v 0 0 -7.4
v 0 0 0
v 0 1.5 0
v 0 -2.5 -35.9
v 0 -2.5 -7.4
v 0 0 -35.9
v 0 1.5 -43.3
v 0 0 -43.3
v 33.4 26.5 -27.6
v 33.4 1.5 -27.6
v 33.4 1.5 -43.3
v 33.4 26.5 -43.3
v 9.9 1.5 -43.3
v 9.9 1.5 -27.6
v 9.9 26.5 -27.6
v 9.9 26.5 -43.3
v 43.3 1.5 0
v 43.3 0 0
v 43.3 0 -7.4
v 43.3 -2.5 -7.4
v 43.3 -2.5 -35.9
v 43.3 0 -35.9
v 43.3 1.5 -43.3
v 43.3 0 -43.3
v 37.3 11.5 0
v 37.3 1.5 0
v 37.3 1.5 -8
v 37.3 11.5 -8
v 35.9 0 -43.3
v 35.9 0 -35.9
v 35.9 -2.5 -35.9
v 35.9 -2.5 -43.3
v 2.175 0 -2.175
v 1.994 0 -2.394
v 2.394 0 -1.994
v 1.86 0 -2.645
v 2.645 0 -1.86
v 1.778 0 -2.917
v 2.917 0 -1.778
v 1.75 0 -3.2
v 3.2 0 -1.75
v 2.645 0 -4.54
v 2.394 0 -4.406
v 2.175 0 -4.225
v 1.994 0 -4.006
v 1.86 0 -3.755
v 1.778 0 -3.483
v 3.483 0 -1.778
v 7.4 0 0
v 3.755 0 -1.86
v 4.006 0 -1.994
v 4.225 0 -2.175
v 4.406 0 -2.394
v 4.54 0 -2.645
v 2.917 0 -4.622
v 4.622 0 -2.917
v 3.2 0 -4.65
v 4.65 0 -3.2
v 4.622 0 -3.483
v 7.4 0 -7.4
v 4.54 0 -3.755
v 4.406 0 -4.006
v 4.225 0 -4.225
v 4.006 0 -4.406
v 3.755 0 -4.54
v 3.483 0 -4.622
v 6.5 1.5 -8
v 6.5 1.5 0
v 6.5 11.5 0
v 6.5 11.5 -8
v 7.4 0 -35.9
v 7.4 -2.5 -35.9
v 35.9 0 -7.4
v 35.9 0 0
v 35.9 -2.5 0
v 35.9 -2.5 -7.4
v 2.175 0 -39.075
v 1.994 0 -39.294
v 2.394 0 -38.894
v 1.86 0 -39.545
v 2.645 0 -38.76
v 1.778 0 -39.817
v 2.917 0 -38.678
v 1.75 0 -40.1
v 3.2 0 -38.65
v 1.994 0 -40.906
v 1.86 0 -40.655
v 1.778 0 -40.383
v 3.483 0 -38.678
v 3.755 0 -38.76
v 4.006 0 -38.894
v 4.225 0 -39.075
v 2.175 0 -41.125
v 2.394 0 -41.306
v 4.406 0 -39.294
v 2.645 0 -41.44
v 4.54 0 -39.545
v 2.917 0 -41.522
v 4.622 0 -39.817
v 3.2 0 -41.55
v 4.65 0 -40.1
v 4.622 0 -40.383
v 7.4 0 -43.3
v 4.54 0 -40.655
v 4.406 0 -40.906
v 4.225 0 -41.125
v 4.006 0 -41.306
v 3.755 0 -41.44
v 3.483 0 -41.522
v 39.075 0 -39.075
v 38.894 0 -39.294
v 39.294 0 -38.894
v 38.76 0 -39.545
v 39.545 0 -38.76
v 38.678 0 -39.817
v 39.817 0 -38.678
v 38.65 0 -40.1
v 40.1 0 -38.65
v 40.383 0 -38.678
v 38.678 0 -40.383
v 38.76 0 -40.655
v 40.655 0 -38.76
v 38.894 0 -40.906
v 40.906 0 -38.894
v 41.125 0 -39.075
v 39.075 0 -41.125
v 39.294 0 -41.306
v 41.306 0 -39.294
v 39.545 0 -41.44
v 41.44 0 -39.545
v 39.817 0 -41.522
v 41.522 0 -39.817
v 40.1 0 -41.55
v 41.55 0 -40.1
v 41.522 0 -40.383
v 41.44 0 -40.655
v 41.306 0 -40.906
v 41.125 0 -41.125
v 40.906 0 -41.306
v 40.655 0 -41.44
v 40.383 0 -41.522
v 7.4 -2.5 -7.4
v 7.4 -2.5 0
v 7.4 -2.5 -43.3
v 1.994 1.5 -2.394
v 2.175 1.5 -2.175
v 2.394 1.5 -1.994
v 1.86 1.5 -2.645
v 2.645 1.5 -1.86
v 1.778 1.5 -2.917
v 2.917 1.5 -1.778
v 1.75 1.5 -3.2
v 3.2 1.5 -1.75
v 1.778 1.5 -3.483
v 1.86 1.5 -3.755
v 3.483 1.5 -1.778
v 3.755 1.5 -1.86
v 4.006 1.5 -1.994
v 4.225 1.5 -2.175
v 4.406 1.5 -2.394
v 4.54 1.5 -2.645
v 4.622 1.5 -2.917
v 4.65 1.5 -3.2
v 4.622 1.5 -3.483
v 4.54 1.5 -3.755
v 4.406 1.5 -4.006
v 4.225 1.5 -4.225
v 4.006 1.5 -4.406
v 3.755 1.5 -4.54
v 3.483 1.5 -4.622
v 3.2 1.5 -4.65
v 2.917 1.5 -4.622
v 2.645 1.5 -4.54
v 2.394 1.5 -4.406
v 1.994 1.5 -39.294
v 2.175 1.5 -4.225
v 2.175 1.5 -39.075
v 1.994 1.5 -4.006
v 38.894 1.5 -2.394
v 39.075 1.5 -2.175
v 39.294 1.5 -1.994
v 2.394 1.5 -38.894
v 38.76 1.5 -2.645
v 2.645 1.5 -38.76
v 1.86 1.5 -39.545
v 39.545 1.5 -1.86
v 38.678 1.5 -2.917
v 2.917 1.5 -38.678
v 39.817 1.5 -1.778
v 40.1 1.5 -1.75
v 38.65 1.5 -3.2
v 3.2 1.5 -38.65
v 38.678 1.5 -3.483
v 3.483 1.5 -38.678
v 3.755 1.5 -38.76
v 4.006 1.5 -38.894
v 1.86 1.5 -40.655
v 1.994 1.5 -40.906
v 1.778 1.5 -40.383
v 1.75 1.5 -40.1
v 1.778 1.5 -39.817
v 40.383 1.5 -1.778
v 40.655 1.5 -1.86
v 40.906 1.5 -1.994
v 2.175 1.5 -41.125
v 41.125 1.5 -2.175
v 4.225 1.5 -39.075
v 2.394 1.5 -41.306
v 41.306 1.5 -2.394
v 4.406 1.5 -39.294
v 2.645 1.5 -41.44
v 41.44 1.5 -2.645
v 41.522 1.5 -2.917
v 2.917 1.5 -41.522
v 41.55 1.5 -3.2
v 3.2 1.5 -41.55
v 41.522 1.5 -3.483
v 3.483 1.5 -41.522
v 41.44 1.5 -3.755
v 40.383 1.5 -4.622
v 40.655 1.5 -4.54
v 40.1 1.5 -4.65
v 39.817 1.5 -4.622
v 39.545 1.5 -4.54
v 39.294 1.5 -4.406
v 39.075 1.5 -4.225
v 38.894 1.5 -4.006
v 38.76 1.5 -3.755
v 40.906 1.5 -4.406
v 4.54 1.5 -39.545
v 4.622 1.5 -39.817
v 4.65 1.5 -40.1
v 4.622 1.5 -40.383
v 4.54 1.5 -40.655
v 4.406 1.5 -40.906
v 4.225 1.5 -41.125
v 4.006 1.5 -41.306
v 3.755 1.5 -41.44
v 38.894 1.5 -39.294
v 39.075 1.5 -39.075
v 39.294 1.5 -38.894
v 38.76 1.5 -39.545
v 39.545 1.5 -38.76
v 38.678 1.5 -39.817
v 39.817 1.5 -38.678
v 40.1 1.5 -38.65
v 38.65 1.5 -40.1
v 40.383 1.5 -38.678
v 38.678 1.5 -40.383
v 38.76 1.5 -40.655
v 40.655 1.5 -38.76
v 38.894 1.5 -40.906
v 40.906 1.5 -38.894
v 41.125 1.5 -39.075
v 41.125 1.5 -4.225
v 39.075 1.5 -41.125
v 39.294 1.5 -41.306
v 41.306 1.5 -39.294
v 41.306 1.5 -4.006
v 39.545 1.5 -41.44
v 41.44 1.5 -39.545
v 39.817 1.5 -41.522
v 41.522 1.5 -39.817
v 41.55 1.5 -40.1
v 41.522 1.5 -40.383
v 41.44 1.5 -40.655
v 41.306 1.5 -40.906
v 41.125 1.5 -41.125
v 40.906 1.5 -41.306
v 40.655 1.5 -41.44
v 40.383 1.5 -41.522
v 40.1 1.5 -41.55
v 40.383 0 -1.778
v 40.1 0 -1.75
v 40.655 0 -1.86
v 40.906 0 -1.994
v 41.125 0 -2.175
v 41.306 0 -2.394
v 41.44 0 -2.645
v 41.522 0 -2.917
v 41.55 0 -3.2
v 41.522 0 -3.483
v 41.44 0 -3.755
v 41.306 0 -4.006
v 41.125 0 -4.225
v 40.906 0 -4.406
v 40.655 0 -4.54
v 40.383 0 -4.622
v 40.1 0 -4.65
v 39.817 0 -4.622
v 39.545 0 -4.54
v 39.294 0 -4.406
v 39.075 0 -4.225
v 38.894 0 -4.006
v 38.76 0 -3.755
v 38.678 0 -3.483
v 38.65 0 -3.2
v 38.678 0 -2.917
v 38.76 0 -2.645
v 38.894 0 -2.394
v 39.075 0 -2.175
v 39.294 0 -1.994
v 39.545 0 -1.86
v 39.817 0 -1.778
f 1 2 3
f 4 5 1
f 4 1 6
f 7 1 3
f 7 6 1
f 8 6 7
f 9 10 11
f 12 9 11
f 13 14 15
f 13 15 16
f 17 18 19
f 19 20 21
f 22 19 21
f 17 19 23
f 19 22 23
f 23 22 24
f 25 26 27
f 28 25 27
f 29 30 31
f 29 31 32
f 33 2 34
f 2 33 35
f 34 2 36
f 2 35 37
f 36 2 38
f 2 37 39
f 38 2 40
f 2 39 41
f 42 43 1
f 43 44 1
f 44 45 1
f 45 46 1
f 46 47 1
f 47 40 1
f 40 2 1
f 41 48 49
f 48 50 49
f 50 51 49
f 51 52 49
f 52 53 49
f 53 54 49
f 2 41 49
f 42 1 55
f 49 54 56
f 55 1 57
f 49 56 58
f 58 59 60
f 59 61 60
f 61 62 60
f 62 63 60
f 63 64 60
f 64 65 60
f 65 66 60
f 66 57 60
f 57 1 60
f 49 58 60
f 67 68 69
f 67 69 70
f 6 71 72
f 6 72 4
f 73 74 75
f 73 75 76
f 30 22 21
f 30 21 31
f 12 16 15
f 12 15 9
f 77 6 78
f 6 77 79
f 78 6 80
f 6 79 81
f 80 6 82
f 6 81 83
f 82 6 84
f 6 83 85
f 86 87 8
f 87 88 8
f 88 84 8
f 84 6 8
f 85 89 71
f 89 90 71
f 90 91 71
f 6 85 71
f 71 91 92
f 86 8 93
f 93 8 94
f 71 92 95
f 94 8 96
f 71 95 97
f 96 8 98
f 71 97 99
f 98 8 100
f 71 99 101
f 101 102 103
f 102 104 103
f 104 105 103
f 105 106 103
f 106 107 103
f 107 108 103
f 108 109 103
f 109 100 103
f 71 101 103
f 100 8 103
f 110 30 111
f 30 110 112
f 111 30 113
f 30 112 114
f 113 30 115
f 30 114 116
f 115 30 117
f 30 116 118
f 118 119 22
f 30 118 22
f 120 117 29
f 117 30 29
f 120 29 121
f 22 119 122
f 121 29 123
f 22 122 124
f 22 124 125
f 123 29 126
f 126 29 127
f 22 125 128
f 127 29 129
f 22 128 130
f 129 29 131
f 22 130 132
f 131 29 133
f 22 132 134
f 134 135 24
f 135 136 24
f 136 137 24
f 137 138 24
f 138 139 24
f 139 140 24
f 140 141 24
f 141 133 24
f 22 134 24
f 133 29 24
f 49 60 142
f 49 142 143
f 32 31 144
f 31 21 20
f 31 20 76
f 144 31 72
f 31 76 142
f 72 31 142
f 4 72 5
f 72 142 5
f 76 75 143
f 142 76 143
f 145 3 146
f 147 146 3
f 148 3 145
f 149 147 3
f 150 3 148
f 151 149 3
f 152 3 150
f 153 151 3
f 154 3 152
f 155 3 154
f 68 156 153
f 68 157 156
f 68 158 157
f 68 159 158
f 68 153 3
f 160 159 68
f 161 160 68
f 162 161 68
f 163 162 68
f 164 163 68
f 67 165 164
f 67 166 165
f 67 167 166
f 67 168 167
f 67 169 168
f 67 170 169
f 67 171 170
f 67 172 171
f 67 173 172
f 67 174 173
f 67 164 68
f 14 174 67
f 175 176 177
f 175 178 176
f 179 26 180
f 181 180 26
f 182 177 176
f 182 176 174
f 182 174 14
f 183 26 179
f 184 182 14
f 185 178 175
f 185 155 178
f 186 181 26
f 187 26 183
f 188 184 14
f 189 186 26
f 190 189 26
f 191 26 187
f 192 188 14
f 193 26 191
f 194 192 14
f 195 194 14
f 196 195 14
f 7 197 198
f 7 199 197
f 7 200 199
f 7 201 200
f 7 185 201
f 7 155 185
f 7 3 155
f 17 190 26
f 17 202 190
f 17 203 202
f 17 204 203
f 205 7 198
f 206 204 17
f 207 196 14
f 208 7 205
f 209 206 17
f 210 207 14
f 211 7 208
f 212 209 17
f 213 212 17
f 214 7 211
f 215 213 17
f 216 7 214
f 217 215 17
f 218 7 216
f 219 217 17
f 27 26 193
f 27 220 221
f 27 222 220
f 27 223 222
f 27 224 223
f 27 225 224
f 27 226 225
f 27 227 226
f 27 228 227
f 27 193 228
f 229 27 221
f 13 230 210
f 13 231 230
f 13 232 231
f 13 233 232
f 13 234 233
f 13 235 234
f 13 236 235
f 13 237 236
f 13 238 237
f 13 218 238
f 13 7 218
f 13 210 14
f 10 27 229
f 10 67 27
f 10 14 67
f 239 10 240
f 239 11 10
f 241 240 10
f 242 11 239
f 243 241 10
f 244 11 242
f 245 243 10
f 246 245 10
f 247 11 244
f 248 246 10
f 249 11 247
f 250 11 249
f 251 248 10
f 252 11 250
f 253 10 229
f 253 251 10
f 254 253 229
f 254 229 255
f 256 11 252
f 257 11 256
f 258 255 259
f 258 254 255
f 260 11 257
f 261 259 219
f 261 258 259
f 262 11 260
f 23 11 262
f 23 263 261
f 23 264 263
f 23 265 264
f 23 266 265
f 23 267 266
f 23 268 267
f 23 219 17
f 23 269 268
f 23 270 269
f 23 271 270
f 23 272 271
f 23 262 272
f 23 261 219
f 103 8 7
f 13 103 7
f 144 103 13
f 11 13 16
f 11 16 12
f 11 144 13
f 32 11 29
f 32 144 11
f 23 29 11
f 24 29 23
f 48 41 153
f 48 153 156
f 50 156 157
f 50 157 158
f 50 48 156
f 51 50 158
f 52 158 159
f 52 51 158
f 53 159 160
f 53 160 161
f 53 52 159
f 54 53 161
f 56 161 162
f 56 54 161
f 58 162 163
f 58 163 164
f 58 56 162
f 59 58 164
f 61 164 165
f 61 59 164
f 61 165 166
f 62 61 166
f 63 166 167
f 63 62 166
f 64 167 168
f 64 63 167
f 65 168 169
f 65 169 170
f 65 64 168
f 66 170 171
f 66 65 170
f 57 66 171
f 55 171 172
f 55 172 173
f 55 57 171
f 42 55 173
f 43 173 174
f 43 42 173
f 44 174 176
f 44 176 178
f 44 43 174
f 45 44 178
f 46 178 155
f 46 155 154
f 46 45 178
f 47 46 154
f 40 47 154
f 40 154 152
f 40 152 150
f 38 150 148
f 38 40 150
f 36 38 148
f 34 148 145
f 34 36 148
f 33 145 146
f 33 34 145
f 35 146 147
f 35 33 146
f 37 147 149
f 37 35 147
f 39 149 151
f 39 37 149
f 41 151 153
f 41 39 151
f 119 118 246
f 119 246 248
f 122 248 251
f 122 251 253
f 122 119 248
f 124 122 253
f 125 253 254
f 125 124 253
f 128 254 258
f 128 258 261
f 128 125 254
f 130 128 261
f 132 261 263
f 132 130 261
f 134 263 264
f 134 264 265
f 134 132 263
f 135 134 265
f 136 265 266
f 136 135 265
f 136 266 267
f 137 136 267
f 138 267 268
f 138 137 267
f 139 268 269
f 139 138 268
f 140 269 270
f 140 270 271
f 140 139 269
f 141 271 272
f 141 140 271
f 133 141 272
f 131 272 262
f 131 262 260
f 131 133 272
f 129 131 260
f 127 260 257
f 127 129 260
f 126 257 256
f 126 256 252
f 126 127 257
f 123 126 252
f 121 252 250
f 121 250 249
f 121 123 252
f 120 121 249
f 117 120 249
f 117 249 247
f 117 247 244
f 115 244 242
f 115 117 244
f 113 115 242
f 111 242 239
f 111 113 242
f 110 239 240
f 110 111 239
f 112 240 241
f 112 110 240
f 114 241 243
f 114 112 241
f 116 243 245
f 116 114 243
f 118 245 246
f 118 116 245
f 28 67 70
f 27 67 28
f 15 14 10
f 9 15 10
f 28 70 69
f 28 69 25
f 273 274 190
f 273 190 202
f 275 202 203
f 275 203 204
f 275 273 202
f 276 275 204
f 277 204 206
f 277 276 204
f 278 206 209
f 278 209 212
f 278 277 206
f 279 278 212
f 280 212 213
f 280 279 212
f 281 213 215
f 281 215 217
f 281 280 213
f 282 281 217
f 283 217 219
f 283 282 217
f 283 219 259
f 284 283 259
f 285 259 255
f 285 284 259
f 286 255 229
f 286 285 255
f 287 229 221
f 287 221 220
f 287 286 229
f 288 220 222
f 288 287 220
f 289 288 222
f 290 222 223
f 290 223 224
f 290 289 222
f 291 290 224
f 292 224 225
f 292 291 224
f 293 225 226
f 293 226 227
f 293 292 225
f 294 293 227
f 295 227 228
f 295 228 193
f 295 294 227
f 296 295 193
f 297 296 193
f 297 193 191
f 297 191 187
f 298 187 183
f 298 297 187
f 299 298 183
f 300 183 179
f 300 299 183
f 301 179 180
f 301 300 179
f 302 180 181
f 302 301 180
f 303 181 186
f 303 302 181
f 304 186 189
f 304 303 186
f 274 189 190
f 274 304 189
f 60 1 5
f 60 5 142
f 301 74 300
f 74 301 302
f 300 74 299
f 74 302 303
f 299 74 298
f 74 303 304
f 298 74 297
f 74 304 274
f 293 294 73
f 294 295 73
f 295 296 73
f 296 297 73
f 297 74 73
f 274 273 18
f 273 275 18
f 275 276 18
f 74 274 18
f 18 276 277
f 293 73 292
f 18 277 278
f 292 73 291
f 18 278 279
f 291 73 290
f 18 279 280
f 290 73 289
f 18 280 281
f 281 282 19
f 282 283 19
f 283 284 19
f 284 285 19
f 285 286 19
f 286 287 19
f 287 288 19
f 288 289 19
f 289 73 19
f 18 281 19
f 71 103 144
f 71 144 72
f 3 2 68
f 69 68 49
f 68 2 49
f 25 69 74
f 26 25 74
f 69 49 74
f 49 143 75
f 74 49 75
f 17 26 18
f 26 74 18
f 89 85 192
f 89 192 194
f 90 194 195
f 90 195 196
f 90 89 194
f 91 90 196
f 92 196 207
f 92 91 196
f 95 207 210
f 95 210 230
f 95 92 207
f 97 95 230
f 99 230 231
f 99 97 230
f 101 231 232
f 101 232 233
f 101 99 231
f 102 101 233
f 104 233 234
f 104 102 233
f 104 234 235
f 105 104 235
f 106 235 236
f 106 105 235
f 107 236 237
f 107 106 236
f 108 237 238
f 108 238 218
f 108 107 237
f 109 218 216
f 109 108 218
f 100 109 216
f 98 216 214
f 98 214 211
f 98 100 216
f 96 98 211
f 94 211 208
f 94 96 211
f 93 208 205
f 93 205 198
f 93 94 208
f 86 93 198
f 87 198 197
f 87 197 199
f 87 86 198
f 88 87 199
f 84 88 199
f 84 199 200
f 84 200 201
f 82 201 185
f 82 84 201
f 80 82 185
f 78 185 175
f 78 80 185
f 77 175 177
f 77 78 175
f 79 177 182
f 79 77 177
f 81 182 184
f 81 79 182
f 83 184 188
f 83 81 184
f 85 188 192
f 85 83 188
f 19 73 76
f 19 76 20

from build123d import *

# Parameters (mm, degrees)
SKETCH1_W           = 43.3
SKETCH1_H           = 43.3
SKETCH1_R           = 1.45
BOSS_EXTRUDE1_DEPTH = 1.5
BOSS_EXTRUDE2_DEPTH = 2.5
SKETCH3_W           = 30.8
SKETCH3_H           = 8
BOSS_EXTRUDE3_DEPTH = 10
SKETCH4_W           = 23.5
SKETCH4_H           = 15.7
BOSS_EXTRUDE4_DEPTH = 25


with BuildPart() as part:
    # Sketch1 → Boss-Extrude1 (new body)
    with BuildSketch(Plane(origin=(0, 0, 0), x_dir=(1, 0, 0), z_dir=(0, 1, 0))):
        with Locations((21.65, 21.65)):
            Rectangle(SKETCH1_W, SKETCH1_H)
        with Locations(Location((3.2, 3.2, 0), (0, 0, 270))):
            Circle(SKETCH1_R, mode=Mode.SUBTRACT)
        with Locations(Location((3.2, 40.1, 0), (0, 0, 270))):
            Circle(SKETCH1_R, mode=Mode.SUBTRACT)
        with Locations(Location((40.1, 40.1, 0), (0, 0, 270))):
            Circle(SKETCH1_R, mode=Mode.SUBTRACT)
        with Locations(Location((40.1, 3.2, 0), (0, 0, 270))):
            Circle(SKETCH1_R, mode=Mode.SUBTRACT)
    extrude(amount=BOSS_EXTRUDE1_DEPTH)

    # Sketch2 → Boss-Extrude2 (add)
    with BuildSketch(Plane.XZ):
        Polygon((0, -35.9), (0, -7.4), (7.4, -7.4), (7.4, 0), (35.9, 0), (35.9, -7.4), (43.3, -7.4), (43.3, -35.9), (35.9, -35.9), (35.9, -43.3), (7.4, -43.3), (7.4, -35.9), align=None)
    extrude(amount=BOSS_EXTRUDE2_DEPTH)

    # Sketch3 → Boss-Extrude3 (add)
    with BuildSketch(Plane(origin=(0, 1.5, 0), x_dir=(1, 0, 0), z_dir=(0, 1, 0))):
        with Locations((21.9, 4)):
            Rectangle(SKETCH3_W, SKETCH3_H)
    extrude(amount=BOSS_EXTRUDE3_DEPTH)

    # Sketch4 → Boss-Extrude4 (add)
    with BuildSketch(Plane(origin=(0, 1.5, 0), x_dir=(1, 0, 0), z_dir=(0, 1, 0))):
        with Locations((21.65, 35.45)):
            Rectangle(SKETCH4_W, SKETCH4_H)
    extrude(amount=BOSS_EXTRUDE4_DEPTH)


solid = part.part
